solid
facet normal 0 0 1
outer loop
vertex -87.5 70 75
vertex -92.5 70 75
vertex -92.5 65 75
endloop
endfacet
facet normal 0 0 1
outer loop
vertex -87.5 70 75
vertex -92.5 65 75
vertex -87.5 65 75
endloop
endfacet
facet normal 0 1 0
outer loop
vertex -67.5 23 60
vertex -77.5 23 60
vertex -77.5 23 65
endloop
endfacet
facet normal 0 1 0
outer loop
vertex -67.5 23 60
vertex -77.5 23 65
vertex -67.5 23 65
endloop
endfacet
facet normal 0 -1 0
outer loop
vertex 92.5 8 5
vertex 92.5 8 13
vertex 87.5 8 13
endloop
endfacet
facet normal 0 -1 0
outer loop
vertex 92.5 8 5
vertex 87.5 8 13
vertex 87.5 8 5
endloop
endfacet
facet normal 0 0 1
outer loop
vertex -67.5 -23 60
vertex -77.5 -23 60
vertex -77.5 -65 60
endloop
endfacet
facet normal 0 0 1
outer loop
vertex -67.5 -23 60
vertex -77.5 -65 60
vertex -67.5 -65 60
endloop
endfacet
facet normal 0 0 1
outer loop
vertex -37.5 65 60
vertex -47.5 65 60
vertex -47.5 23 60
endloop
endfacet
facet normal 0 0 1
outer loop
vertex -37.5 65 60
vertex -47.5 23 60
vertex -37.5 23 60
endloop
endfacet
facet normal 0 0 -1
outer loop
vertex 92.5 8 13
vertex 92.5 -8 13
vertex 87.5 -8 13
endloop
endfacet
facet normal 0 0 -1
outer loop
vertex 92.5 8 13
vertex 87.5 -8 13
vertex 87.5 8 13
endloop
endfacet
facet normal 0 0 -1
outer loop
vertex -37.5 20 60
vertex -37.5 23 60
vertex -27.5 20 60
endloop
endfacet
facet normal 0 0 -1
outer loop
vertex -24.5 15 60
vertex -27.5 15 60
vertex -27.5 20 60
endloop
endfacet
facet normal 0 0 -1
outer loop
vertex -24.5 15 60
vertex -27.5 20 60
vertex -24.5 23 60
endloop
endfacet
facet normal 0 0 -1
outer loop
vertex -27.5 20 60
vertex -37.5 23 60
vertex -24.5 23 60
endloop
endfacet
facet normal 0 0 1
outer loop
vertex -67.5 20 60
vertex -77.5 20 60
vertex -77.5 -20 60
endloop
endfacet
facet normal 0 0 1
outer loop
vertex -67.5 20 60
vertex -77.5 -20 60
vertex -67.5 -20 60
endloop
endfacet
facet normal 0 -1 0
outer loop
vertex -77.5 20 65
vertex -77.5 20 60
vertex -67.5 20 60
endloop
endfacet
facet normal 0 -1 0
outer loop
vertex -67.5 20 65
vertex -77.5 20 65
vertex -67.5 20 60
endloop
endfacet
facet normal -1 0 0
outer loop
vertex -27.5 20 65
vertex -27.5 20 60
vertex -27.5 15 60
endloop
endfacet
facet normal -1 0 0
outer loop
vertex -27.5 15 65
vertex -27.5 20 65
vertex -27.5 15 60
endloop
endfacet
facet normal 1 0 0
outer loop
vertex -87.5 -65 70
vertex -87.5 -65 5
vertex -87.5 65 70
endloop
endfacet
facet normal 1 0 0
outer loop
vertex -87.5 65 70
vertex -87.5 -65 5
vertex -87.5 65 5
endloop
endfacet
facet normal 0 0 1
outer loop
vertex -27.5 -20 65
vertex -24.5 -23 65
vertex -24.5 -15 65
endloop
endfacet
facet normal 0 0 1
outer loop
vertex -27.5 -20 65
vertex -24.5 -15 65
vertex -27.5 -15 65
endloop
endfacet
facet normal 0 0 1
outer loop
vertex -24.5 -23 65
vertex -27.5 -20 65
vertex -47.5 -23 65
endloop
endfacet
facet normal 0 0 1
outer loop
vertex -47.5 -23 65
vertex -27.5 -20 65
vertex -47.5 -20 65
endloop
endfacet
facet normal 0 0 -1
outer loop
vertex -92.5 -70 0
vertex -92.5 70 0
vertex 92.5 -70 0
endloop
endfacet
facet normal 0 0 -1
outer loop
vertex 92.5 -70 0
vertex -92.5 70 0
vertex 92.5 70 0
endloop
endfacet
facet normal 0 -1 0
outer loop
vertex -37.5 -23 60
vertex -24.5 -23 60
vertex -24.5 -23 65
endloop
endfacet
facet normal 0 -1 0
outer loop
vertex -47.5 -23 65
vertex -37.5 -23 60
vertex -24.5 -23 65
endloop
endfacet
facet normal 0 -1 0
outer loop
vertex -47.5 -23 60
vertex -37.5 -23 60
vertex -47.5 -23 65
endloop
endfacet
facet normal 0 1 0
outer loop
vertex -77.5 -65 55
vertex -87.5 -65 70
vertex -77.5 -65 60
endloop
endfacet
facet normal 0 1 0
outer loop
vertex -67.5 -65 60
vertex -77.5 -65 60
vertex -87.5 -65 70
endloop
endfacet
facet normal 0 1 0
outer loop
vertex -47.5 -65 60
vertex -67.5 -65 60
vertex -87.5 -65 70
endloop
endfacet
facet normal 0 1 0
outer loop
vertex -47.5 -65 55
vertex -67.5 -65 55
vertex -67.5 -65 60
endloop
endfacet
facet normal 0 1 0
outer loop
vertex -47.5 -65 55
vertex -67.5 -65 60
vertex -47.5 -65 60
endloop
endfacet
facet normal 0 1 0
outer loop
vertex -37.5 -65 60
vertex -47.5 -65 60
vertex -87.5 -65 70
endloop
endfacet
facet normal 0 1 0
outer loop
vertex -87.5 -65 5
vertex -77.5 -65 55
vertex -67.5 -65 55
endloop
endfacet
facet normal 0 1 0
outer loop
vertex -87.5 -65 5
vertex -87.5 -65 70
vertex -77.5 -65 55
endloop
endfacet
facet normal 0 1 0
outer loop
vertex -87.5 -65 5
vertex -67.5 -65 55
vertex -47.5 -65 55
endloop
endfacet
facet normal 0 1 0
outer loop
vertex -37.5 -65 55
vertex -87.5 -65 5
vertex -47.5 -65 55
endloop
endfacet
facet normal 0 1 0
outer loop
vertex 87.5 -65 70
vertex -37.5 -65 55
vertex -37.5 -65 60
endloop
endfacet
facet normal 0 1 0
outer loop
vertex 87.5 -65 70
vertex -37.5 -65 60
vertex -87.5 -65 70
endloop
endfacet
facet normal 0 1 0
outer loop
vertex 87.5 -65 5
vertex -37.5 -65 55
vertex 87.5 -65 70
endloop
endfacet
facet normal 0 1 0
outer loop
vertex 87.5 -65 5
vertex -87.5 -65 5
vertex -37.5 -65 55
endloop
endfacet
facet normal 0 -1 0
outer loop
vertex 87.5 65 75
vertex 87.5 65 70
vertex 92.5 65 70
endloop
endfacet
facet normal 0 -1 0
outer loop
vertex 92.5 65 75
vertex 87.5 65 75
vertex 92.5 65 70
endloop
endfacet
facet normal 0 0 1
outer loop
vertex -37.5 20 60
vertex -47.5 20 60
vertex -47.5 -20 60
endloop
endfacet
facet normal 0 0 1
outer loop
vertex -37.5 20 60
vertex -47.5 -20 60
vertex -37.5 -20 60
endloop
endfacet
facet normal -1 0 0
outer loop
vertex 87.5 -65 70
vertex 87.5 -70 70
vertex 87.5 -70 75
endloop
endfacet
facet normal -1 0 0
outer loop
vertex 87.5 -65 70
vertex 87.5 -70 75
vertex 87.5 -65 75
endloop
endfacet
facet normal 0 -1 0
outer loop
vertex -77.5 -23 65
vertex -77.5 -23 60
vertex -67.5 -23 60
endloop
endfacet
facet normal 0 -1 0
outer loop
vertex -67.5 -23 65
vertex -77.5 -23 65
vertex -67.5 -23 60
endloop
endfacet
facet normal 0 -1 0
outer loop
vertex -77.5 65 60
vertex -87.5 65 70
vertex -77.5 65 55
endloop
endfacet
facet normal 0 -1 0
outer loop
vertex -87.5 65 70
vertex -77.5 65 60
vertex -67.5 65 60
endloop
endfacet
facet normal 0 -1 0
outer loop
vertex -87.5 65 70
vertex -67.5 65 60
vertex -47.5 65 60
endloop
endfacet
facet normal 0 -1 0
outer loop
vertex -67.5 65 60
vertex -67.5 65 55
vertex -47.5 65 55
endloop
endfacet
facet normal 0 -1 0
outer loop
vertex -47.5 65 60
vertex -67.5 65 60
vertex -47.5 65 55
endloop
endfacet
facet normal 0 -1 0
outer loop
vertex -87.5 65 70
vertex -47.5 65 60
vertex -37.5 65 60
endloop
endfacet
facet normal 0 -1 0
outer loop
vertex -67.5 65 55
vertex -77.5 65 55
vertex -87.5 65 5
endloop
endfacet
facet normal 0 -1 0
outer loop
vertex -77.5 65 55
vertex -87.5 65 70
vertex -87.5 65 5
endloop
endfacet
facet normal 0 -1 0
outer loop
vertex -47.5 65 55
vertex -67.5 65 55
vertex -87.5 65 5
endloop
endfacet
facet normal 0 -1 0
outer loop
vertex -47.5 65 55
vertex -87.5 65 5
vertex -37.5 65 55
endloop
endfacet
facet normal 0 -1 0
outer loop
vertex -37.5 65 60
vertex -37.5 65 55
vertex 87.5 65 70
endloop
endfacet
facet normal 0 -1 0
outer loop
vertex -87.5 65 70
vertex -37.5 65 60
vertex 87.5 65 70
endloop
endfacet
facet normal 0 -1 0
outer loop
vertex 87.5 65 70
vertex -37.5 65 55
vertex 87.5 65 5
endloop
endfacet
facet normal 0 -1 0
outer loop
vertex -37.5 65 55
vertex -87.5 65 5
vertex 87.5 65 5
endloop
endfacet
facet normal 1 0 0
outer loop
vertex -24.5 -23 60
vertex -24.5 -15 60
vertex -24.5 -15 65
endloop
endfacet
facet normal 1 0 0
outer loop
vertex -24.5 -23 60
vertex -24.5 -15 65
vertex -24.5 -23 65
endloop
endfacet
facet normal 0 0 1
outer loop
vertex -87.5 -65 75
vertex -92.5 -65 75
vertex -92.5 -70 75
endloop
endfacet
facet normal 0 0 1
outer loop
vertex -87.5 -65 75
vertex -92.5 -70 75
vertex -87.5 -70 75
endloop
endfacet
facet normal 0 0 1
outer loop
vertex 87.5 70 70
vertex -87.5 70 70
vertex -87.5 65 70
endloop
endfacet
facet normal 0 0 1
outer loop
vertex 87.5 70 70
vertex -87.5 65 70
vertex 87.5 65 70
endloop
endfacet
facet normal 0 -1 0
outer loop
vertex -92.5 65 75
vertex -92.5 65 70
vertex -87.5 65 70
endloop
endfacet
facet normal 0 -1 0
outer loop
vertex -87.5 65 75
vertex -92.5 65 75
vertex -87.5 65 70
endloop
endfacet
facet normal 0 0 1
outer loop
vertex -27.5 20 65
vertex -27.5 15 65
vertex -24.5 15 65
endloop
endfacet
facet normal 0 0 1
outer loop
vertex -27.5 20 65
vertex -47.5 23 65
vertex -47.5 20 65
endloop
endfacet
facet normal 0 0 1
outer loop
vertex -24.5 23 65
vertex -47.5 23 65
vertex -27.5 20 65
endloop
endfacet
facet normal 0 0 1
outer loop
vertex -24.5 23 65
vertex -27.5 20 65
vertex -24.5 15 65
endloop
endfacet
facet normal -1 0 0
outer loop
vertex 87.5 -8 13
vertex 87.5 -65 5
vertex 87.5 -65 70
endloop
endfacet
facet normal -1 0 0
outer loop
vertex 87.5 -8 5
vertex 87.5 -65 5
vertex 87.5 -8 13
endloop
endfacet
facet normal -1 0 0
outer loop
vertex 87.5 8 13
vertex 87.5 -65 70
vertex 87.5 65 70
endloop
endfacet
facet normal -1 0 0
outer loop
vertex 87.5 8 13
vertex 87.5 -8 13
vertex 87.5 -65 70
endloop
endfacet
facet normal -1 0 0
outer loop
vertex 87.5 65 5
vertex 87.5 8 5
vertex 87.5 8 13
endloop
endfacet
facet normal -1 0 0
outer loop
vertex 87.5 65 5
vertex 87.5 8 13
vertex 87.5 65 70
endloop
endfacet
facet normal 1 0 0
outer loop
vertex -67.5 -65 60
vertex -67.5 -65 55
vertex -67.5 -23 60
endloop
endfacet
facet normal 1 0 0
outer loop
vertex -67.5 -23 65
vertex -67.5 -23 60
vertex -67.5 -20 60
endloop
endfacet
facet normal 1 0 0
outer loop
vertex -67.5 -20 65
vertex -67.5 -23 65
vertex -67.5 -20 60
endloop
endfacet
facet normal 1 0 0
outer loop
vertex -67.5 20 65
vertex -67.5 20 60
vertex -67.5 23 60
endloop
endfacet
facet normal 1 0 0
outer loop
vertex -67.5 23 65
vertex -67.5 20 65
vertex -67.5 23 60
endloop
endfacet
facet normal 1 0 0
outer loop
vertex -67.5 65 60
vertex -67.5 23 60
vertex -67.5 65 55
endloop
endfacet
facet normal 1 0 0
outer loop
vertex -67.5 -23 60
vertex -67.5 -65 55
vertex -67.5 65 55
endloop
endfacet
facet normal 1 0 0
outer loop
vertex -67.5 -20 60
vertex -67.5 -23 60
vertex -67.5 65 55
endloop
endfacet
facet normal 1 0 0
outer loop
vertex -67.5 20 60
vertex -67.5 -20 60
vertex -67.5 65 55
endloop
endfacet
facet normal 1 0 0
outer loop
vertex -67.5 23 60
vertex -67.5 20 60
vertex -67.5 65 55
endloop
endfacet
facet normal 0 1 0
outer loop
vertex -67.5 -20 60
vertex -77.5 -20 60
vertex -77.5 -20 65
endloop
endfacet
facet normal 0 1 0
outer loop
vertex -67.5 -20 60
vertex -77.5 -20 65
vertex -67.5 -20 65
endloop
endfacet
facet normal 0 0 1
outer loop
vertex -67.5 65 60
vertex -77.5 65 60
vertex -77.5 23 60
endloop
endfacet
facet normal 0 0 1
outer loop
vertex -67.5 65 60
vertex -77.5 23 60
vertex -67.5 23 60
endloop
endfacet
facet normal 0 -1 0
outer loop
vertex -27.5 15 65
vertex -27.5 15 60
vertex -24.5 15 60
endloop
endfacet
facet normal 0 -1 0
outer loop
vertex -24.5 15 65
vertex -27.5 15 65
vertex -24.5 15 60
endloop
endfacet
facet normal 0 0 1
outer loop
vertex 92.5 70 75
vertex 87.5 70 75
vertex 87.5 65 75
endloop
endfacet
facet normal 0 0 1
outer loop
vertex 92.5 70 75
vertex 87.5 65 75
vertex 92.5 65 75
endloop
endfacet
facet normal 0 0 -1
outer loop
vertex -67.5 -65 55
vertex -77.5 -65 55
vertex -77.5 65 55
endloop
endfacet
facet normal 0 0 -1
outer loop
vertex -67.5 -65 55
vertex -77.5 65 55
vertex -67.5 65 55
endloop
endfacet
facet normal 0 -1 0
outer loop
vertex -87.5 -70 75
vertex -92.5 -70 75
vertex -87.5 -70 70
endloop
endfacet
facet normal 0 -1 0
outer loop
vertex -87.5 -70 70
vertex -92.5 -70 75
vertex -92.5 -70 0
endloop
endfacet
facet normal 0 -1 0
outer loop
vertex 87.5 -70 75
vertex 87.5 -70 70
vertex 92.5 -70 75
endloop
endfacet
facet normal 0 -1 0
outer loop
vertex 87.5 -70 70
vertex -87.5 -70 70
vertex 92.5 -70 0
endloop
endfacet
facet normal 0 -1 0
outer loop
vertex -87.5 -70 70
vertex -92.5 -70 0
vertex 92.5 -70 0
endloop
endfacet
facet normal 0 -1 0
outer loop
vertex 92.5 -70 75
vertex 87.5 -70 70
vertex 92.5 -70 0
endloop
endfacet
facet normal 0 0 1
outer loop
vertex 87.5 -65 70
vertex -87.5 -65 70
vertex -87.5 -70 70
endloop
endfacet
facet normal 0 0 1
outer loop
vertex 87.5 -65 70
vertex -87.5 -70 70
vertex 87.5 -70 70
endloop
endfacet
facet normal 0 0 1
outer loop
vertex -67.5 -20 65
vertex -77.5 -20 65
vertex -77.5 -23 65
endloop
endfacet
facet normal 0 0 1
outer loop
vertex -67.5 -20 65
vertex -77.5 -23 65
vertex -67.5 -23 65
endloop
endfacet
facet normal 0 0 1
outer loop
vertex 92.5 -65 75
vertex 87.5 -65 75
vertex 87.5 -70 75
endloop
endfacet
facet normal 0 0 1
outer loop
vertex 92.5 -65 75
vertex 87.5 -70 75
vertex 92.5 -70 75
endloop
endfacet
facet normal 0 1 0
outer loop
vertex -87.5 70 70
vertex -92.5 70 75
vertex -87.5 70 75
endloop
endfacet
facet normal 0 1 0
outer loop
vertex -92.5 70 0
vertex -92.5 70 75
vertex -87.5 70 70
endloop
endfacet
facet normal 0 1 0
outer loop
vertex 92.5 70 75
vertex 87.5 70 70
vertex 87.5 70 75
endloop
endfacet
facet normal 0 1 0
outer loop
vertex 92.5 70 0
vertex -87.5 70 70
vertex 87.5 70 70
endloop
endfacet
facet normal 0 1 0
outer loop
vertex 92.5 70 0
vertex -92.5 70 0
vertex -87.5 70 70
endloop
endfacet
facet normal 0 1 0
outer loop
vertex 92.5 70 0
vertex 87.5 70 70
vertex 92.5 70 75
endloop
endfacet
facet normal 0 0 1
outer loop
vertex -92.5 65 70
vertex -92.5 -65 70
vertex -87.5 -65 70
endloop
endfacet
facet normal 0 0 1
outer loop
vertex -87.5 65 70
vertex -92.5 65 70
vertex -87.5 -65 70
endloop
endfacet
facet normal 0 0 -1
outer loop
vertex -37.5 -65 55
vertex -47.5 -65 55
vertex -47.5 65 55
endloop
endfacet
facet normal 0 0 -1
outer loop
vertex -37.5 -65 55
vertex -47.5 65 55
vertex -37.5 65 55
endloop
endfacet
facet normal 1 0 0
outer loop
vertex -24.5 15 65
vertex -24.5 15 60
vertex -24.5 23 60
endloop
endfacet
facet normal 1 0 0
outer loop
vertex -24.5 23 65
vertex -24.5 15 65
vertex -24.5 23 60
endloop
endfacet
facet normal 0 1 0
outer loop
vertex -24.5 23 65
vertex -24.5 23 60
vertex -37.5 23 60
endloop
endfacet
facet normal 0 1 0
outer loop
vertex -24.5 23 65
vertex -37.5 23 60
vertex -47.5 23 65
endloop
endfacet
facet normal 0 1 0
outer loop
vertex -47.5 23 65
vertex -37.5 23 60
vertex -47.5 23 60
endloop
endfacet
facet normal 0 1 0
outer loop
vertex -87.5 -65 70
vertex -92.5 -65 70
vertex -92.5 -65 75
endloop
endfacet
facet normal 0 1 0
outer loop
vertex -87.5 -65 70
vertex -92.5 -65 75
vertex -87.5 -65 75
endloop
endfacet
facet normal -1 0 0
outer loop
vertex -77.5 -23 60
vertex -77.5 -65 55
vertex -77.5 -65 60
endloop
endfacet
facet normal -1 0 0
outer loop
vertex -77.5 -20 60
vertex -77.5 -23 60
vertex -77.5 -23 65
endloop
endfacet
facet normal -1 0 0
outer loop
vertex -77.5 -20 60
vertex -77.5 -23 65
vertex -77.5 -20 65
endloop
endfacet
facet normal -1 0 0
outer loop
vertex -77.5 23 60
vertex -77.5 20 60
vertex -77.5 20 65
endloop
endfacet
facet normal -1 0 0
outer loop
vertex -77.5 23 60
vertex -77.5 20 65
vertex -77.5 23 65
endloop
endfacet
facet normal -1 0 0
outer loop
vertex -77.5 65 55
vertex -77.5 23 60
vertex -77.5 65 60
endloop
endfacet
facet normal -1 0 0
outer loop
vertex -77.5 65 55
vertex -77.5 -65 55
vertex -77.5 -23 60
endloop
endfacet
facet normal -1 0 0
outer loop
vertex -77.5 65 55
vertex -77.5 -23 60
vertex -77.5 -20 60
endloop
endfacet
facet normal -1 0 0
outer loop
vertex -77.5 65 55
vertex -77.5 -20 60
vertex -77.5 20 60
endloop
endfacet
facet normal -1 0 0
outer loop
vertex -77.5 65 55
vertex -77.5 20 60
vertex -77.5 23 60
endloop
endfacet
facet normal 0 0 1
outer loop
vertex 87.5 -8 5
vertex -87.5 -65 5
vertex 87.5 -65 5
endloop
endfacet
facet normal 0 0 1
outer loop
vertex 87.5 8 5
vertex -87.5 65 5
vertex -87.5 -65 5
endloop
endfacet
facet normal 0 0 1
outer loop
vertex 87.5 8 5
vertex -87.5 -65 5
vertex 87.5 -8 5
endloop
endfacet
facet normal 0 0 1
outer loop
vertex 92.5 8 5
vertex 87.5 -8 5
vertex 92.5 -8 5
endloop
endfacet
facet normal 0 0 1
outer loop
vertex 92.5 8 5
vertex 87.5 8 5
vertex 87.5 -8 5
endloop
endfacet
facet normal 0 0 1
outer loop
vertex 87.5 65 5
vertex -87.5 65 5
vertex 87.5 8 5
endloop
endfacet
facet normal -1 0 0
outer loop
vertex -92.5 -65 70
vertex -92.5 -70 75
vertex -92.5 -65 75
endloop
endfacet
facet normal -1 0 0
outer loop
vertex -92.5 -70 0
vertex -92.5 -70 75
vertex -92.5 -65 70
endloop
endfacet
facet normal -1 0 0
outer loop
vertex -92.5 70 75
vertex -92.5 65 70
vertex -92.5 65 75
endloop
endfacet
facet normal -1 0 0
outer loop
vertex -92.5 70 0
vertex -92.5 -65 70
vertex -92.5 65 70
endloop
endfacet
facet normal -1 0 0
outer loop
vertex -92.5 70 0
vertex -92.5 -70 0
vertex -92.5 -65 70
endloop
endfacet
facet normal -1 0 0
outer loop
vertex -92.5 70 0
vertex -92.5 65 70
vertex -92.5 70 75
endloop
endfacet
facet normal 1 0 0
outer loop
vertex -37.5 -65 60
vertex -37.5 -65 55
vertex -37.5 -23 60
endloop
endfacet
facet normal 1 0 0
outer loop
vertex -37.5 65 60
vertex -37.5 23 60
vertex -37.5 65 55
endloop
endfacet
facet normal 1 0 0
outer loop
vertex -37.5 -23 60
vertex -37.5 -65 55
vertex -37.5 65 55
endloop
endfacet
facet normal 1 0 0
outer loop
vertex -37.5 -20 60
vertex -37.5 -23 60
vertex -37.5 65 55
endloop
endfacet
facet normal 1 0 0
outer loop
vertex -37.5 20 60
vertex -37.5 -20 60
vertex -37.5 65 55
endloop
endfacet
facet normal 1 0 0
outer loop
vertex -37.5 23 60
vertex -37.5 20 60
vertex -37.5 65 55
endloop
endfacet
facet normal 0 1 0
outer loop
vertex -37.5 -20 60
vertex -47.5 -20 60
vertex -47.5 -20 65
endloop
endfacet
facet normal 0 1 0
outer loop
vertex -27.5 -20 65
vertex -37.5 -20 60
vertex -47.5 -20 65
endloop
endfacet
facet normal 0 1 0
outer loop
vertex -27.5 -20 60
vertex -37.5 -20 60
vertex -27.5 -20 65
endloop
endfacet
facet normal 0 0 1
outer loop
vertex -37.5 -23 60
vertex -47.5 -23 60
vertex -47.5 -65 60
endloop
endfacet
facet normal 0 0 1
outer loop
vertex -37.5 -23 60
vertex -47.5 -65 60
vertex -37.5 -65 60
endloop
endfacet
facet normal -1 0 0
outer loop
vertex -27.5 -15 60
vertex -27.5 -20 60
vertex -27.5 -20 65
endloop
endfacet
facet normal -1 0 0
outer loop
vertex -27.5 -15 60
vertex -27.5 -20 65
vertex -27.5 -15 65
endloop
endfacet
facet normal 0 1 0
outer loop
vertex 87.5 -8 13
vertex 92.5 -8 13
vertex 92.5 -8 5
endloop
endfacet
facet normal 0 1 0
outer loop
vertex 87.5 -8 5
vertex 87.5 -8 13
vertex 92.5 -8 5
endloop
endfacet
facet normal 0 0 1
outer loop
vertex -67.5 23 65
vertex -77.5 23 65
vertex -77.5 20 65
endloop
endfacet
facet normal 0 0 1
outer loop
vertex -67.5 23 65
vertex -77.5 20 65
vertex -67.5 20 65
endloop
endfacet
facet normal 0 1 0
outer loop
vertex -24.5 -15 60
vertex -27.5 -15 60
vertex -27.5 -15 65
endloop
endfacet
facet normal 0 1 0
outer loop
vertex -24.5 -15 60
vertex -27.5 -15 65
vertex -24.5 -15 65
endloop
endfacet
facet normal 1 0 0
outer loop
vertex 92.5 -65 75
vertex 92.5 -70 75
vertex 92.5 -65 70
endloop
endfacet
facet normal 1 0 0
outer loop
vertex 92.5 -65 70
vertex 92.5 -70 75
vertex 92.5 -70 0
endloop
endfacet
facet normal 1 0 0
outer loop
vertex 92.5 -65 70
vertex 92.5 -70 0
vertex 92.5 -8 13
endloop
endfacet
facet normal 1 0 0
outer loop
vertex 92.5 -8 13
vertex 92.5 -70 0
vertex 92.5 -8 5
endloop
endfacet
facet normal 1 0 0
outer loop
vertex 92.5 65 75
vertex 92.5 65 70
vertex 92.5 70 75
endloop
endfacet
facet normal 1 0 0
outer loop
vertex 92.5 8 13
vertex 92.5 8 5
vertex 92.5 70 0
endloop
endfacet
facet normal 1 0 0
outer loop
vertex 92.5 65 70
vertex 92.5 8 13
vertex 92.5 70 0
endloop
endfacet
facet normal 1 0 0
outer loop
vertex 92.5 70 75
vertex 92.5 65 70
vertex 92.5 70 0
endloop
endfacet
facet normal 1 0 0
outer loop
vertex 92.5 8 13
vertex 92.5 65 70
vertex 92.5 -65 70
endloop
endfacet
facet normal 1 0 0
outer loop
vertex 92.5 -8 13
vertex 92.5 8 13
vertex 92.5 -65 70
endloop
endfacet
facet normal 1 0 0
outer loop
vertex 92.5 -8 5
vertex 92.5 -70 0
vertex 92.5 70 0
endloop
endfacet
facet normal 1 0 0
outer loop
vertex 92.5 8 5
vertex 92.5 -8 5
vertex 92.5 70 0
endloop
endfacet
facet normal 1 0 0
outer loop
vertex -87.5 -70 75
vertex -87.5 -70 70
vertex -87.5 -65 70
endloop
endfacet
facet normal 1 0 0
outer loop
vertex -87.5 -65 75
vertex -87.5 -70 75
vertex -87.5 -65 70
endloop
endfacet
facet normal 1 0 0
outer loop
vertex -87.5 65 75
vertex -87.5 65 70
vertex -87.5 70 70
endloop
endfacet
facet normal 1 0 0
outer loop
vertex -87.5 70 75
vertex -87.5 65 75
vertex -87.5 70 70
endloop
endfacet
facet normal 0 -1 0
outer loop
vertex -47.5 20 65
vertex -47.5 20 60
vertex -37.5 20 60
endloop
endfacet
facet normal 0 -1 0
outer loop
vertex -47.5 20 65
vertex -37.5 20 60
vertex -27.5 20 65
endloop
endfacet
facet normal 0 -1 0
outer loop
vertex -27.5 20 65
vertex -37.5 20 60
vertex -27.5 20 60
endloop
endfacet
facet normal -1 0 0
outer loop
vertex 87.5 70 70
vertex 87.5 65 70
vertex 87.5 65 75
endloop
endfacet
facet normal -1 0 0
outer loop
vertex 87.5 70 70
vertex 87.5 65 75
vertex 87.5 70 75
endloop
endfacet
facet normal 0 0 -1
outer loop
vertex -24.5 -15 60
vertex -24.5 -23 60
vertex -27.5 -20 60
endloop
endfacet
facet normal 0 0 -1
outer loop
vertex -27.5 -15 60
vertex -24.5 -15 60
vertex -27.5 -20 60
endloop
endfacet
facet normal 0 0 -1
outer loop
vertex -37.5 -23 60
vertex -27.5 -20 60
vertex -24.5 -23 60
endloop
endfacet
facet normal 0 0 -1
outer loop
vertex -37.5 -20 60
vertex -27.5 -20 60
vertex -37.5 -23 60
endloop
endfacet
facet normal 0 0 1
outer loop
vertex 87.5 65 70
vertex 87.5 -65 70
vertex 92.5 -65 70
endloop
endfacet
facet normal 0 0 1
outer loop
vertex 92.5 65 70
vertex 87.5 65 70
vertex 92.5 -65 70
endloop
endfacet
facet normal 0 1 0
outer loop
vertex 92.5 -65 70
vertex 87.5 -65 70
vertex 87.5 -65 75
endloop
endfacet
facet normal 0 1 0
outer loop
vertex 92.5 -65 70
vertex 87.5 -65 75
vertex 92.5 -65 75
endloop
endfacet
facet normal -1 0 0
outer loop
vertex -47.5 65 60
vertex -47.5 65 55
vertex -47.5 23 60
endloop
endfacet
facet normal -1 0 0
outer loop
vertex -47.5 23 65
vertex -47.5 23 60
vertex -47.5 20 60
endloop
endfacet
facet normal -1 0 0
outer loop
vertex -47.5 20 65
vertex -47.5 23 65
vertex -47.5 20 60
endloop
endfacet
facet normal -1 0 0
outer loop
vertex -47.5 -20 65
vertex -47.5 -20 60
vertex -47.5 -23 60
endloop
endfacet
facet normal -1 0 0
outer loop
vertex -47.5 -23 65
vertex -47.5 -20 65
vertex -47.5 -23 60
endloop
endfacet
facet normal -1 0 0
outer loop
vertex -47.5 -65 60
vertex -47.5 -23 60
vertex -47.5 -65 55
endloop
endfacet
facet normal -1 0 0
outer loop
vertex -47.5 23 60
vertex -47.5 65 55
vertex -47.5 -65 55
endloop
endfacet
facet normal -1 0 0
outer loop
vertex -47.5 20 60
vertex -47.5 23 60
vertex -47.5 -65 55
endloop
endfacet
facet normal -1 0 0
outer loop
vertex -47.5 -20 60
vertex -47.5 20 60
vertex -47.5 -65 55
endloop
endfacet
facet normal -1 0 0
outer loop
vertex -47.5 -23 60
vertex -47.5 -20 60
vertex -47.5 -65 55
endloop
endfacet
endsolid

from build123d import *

# Parameters (mm, degrees)
SKETCH1_W           = 185
SKETCH1_H           = 140
BOSS_EXTRUDE1_DEPTH = 70
SHELL1_T            = -5
BOSS_EXTRUDE2_START = 50
SKETCH2_W           = 10
SKETCH2_H           = 130
BOSS_EXTRUDE2_DEPTH = 5
SKETCH3_W           = 10
SKETCH3_H           = 3
BOSS_EXTRUDE6_DEPTH = 5
SKETCH5_W           = 8
SKETCH5_H           = 16
CUT_EXTRUDE1_DEPTH  = 5
SKETCH6_W           = 5
SKETCH6_H           = 5
BOSS_EXTRUDE7_DEPTH = 5


with BuildPart() as part:
    # Sketch1 → Boss-Extrude1 (new body)
    with BuildSketch(Plane.XY):
        Rectangle(SKETCH1_W, SKETCH1_H)
    extrude(amount=BOSS_EXTRUDE1_DEPTH)

    # Shell1
    shell1_openings = [part.faces().sort_by_distance(p)[0] for p in [
        (0, 0, 70),
    ]]
    offset(amount=SHELL1_T, openings=shell1_openings, kind=Kind.INTERSECTION)

    # Sketch2 → Boss-Extrude2 (add)
    with BuildSketch(Plane.XY.offset(5).offset(BOSS_EXTRUDE2_START)):
        with Locations((-72.5, 0)):
            Rectangle(SKETCH2_W, SKETCH2_H)
        with Locations((-42.5, 0)):
            Rectangle(SKETCH2_W, SKETCH2_H)
    extrude(amount=BOSS_EXTRUDE2_DEPTH)

    # Sketch3 → Boss-Extrude6 (add)
    with BuildSketch(Plane.XY.offset(60)):
        Polygon((-47.5, 20), (-27.5, 20), (-27.5, 15), (-24.5, 15), (-24.5, 23), (-47.5, 23), align=None)
        Polygon((-47.5, -20), (-27.5, -20), (-27.5, -15), (-24.5, -15), (-24.5, -23), (-47.5, -23), align=None)
        with Locations((-72.5, 21.5)):
            Rectangle(SKETCH3_W, SKETCH3_H)
        with Locations((-72.5, -21.5)):
            Rectangle(SKETCH3_W, SKETCH3_H)
    extrude(amount=BOSS_EXTRUDE6_DEPTH)

    # Sketch5 → Cut-Extrude1 (cut)
    with BuildSketch(Plane(origin=(92.5, 0, 0), x_dir=(0, 0, -1), z_dir=(1, 0, 0))):
        with Locations((-9, 0)):
            Rectangle(SKETCH5_W, SKETCH5_H)
    extrude(amount=-CUT_EXTRUDE1_DEPTH, mode=Mode.SUBTRACT)

    # Sketch6 → Boss-Extrude7 (add)
    with BuildSketch(Plane.XY.offset(70)):
        with Locations((-90, 67.5)):
            Rectangle(SKETCH6_W, SKETCH6_H)
        with Locations((-90, -67.5)):
            Rectangle(SKETCH6_W, SKETCH6_H)
        with Locations((90, -67.5)):
            Rectangle(SKETCH6_W, SKETCH6_H)
        with Locations((90, 67.5)):
            Rectangle(SKETCH6_W, SKETCH6_H)
    extrude(amount=BOSS_EXTRUDE7_DEPTH)


solid = part.part
